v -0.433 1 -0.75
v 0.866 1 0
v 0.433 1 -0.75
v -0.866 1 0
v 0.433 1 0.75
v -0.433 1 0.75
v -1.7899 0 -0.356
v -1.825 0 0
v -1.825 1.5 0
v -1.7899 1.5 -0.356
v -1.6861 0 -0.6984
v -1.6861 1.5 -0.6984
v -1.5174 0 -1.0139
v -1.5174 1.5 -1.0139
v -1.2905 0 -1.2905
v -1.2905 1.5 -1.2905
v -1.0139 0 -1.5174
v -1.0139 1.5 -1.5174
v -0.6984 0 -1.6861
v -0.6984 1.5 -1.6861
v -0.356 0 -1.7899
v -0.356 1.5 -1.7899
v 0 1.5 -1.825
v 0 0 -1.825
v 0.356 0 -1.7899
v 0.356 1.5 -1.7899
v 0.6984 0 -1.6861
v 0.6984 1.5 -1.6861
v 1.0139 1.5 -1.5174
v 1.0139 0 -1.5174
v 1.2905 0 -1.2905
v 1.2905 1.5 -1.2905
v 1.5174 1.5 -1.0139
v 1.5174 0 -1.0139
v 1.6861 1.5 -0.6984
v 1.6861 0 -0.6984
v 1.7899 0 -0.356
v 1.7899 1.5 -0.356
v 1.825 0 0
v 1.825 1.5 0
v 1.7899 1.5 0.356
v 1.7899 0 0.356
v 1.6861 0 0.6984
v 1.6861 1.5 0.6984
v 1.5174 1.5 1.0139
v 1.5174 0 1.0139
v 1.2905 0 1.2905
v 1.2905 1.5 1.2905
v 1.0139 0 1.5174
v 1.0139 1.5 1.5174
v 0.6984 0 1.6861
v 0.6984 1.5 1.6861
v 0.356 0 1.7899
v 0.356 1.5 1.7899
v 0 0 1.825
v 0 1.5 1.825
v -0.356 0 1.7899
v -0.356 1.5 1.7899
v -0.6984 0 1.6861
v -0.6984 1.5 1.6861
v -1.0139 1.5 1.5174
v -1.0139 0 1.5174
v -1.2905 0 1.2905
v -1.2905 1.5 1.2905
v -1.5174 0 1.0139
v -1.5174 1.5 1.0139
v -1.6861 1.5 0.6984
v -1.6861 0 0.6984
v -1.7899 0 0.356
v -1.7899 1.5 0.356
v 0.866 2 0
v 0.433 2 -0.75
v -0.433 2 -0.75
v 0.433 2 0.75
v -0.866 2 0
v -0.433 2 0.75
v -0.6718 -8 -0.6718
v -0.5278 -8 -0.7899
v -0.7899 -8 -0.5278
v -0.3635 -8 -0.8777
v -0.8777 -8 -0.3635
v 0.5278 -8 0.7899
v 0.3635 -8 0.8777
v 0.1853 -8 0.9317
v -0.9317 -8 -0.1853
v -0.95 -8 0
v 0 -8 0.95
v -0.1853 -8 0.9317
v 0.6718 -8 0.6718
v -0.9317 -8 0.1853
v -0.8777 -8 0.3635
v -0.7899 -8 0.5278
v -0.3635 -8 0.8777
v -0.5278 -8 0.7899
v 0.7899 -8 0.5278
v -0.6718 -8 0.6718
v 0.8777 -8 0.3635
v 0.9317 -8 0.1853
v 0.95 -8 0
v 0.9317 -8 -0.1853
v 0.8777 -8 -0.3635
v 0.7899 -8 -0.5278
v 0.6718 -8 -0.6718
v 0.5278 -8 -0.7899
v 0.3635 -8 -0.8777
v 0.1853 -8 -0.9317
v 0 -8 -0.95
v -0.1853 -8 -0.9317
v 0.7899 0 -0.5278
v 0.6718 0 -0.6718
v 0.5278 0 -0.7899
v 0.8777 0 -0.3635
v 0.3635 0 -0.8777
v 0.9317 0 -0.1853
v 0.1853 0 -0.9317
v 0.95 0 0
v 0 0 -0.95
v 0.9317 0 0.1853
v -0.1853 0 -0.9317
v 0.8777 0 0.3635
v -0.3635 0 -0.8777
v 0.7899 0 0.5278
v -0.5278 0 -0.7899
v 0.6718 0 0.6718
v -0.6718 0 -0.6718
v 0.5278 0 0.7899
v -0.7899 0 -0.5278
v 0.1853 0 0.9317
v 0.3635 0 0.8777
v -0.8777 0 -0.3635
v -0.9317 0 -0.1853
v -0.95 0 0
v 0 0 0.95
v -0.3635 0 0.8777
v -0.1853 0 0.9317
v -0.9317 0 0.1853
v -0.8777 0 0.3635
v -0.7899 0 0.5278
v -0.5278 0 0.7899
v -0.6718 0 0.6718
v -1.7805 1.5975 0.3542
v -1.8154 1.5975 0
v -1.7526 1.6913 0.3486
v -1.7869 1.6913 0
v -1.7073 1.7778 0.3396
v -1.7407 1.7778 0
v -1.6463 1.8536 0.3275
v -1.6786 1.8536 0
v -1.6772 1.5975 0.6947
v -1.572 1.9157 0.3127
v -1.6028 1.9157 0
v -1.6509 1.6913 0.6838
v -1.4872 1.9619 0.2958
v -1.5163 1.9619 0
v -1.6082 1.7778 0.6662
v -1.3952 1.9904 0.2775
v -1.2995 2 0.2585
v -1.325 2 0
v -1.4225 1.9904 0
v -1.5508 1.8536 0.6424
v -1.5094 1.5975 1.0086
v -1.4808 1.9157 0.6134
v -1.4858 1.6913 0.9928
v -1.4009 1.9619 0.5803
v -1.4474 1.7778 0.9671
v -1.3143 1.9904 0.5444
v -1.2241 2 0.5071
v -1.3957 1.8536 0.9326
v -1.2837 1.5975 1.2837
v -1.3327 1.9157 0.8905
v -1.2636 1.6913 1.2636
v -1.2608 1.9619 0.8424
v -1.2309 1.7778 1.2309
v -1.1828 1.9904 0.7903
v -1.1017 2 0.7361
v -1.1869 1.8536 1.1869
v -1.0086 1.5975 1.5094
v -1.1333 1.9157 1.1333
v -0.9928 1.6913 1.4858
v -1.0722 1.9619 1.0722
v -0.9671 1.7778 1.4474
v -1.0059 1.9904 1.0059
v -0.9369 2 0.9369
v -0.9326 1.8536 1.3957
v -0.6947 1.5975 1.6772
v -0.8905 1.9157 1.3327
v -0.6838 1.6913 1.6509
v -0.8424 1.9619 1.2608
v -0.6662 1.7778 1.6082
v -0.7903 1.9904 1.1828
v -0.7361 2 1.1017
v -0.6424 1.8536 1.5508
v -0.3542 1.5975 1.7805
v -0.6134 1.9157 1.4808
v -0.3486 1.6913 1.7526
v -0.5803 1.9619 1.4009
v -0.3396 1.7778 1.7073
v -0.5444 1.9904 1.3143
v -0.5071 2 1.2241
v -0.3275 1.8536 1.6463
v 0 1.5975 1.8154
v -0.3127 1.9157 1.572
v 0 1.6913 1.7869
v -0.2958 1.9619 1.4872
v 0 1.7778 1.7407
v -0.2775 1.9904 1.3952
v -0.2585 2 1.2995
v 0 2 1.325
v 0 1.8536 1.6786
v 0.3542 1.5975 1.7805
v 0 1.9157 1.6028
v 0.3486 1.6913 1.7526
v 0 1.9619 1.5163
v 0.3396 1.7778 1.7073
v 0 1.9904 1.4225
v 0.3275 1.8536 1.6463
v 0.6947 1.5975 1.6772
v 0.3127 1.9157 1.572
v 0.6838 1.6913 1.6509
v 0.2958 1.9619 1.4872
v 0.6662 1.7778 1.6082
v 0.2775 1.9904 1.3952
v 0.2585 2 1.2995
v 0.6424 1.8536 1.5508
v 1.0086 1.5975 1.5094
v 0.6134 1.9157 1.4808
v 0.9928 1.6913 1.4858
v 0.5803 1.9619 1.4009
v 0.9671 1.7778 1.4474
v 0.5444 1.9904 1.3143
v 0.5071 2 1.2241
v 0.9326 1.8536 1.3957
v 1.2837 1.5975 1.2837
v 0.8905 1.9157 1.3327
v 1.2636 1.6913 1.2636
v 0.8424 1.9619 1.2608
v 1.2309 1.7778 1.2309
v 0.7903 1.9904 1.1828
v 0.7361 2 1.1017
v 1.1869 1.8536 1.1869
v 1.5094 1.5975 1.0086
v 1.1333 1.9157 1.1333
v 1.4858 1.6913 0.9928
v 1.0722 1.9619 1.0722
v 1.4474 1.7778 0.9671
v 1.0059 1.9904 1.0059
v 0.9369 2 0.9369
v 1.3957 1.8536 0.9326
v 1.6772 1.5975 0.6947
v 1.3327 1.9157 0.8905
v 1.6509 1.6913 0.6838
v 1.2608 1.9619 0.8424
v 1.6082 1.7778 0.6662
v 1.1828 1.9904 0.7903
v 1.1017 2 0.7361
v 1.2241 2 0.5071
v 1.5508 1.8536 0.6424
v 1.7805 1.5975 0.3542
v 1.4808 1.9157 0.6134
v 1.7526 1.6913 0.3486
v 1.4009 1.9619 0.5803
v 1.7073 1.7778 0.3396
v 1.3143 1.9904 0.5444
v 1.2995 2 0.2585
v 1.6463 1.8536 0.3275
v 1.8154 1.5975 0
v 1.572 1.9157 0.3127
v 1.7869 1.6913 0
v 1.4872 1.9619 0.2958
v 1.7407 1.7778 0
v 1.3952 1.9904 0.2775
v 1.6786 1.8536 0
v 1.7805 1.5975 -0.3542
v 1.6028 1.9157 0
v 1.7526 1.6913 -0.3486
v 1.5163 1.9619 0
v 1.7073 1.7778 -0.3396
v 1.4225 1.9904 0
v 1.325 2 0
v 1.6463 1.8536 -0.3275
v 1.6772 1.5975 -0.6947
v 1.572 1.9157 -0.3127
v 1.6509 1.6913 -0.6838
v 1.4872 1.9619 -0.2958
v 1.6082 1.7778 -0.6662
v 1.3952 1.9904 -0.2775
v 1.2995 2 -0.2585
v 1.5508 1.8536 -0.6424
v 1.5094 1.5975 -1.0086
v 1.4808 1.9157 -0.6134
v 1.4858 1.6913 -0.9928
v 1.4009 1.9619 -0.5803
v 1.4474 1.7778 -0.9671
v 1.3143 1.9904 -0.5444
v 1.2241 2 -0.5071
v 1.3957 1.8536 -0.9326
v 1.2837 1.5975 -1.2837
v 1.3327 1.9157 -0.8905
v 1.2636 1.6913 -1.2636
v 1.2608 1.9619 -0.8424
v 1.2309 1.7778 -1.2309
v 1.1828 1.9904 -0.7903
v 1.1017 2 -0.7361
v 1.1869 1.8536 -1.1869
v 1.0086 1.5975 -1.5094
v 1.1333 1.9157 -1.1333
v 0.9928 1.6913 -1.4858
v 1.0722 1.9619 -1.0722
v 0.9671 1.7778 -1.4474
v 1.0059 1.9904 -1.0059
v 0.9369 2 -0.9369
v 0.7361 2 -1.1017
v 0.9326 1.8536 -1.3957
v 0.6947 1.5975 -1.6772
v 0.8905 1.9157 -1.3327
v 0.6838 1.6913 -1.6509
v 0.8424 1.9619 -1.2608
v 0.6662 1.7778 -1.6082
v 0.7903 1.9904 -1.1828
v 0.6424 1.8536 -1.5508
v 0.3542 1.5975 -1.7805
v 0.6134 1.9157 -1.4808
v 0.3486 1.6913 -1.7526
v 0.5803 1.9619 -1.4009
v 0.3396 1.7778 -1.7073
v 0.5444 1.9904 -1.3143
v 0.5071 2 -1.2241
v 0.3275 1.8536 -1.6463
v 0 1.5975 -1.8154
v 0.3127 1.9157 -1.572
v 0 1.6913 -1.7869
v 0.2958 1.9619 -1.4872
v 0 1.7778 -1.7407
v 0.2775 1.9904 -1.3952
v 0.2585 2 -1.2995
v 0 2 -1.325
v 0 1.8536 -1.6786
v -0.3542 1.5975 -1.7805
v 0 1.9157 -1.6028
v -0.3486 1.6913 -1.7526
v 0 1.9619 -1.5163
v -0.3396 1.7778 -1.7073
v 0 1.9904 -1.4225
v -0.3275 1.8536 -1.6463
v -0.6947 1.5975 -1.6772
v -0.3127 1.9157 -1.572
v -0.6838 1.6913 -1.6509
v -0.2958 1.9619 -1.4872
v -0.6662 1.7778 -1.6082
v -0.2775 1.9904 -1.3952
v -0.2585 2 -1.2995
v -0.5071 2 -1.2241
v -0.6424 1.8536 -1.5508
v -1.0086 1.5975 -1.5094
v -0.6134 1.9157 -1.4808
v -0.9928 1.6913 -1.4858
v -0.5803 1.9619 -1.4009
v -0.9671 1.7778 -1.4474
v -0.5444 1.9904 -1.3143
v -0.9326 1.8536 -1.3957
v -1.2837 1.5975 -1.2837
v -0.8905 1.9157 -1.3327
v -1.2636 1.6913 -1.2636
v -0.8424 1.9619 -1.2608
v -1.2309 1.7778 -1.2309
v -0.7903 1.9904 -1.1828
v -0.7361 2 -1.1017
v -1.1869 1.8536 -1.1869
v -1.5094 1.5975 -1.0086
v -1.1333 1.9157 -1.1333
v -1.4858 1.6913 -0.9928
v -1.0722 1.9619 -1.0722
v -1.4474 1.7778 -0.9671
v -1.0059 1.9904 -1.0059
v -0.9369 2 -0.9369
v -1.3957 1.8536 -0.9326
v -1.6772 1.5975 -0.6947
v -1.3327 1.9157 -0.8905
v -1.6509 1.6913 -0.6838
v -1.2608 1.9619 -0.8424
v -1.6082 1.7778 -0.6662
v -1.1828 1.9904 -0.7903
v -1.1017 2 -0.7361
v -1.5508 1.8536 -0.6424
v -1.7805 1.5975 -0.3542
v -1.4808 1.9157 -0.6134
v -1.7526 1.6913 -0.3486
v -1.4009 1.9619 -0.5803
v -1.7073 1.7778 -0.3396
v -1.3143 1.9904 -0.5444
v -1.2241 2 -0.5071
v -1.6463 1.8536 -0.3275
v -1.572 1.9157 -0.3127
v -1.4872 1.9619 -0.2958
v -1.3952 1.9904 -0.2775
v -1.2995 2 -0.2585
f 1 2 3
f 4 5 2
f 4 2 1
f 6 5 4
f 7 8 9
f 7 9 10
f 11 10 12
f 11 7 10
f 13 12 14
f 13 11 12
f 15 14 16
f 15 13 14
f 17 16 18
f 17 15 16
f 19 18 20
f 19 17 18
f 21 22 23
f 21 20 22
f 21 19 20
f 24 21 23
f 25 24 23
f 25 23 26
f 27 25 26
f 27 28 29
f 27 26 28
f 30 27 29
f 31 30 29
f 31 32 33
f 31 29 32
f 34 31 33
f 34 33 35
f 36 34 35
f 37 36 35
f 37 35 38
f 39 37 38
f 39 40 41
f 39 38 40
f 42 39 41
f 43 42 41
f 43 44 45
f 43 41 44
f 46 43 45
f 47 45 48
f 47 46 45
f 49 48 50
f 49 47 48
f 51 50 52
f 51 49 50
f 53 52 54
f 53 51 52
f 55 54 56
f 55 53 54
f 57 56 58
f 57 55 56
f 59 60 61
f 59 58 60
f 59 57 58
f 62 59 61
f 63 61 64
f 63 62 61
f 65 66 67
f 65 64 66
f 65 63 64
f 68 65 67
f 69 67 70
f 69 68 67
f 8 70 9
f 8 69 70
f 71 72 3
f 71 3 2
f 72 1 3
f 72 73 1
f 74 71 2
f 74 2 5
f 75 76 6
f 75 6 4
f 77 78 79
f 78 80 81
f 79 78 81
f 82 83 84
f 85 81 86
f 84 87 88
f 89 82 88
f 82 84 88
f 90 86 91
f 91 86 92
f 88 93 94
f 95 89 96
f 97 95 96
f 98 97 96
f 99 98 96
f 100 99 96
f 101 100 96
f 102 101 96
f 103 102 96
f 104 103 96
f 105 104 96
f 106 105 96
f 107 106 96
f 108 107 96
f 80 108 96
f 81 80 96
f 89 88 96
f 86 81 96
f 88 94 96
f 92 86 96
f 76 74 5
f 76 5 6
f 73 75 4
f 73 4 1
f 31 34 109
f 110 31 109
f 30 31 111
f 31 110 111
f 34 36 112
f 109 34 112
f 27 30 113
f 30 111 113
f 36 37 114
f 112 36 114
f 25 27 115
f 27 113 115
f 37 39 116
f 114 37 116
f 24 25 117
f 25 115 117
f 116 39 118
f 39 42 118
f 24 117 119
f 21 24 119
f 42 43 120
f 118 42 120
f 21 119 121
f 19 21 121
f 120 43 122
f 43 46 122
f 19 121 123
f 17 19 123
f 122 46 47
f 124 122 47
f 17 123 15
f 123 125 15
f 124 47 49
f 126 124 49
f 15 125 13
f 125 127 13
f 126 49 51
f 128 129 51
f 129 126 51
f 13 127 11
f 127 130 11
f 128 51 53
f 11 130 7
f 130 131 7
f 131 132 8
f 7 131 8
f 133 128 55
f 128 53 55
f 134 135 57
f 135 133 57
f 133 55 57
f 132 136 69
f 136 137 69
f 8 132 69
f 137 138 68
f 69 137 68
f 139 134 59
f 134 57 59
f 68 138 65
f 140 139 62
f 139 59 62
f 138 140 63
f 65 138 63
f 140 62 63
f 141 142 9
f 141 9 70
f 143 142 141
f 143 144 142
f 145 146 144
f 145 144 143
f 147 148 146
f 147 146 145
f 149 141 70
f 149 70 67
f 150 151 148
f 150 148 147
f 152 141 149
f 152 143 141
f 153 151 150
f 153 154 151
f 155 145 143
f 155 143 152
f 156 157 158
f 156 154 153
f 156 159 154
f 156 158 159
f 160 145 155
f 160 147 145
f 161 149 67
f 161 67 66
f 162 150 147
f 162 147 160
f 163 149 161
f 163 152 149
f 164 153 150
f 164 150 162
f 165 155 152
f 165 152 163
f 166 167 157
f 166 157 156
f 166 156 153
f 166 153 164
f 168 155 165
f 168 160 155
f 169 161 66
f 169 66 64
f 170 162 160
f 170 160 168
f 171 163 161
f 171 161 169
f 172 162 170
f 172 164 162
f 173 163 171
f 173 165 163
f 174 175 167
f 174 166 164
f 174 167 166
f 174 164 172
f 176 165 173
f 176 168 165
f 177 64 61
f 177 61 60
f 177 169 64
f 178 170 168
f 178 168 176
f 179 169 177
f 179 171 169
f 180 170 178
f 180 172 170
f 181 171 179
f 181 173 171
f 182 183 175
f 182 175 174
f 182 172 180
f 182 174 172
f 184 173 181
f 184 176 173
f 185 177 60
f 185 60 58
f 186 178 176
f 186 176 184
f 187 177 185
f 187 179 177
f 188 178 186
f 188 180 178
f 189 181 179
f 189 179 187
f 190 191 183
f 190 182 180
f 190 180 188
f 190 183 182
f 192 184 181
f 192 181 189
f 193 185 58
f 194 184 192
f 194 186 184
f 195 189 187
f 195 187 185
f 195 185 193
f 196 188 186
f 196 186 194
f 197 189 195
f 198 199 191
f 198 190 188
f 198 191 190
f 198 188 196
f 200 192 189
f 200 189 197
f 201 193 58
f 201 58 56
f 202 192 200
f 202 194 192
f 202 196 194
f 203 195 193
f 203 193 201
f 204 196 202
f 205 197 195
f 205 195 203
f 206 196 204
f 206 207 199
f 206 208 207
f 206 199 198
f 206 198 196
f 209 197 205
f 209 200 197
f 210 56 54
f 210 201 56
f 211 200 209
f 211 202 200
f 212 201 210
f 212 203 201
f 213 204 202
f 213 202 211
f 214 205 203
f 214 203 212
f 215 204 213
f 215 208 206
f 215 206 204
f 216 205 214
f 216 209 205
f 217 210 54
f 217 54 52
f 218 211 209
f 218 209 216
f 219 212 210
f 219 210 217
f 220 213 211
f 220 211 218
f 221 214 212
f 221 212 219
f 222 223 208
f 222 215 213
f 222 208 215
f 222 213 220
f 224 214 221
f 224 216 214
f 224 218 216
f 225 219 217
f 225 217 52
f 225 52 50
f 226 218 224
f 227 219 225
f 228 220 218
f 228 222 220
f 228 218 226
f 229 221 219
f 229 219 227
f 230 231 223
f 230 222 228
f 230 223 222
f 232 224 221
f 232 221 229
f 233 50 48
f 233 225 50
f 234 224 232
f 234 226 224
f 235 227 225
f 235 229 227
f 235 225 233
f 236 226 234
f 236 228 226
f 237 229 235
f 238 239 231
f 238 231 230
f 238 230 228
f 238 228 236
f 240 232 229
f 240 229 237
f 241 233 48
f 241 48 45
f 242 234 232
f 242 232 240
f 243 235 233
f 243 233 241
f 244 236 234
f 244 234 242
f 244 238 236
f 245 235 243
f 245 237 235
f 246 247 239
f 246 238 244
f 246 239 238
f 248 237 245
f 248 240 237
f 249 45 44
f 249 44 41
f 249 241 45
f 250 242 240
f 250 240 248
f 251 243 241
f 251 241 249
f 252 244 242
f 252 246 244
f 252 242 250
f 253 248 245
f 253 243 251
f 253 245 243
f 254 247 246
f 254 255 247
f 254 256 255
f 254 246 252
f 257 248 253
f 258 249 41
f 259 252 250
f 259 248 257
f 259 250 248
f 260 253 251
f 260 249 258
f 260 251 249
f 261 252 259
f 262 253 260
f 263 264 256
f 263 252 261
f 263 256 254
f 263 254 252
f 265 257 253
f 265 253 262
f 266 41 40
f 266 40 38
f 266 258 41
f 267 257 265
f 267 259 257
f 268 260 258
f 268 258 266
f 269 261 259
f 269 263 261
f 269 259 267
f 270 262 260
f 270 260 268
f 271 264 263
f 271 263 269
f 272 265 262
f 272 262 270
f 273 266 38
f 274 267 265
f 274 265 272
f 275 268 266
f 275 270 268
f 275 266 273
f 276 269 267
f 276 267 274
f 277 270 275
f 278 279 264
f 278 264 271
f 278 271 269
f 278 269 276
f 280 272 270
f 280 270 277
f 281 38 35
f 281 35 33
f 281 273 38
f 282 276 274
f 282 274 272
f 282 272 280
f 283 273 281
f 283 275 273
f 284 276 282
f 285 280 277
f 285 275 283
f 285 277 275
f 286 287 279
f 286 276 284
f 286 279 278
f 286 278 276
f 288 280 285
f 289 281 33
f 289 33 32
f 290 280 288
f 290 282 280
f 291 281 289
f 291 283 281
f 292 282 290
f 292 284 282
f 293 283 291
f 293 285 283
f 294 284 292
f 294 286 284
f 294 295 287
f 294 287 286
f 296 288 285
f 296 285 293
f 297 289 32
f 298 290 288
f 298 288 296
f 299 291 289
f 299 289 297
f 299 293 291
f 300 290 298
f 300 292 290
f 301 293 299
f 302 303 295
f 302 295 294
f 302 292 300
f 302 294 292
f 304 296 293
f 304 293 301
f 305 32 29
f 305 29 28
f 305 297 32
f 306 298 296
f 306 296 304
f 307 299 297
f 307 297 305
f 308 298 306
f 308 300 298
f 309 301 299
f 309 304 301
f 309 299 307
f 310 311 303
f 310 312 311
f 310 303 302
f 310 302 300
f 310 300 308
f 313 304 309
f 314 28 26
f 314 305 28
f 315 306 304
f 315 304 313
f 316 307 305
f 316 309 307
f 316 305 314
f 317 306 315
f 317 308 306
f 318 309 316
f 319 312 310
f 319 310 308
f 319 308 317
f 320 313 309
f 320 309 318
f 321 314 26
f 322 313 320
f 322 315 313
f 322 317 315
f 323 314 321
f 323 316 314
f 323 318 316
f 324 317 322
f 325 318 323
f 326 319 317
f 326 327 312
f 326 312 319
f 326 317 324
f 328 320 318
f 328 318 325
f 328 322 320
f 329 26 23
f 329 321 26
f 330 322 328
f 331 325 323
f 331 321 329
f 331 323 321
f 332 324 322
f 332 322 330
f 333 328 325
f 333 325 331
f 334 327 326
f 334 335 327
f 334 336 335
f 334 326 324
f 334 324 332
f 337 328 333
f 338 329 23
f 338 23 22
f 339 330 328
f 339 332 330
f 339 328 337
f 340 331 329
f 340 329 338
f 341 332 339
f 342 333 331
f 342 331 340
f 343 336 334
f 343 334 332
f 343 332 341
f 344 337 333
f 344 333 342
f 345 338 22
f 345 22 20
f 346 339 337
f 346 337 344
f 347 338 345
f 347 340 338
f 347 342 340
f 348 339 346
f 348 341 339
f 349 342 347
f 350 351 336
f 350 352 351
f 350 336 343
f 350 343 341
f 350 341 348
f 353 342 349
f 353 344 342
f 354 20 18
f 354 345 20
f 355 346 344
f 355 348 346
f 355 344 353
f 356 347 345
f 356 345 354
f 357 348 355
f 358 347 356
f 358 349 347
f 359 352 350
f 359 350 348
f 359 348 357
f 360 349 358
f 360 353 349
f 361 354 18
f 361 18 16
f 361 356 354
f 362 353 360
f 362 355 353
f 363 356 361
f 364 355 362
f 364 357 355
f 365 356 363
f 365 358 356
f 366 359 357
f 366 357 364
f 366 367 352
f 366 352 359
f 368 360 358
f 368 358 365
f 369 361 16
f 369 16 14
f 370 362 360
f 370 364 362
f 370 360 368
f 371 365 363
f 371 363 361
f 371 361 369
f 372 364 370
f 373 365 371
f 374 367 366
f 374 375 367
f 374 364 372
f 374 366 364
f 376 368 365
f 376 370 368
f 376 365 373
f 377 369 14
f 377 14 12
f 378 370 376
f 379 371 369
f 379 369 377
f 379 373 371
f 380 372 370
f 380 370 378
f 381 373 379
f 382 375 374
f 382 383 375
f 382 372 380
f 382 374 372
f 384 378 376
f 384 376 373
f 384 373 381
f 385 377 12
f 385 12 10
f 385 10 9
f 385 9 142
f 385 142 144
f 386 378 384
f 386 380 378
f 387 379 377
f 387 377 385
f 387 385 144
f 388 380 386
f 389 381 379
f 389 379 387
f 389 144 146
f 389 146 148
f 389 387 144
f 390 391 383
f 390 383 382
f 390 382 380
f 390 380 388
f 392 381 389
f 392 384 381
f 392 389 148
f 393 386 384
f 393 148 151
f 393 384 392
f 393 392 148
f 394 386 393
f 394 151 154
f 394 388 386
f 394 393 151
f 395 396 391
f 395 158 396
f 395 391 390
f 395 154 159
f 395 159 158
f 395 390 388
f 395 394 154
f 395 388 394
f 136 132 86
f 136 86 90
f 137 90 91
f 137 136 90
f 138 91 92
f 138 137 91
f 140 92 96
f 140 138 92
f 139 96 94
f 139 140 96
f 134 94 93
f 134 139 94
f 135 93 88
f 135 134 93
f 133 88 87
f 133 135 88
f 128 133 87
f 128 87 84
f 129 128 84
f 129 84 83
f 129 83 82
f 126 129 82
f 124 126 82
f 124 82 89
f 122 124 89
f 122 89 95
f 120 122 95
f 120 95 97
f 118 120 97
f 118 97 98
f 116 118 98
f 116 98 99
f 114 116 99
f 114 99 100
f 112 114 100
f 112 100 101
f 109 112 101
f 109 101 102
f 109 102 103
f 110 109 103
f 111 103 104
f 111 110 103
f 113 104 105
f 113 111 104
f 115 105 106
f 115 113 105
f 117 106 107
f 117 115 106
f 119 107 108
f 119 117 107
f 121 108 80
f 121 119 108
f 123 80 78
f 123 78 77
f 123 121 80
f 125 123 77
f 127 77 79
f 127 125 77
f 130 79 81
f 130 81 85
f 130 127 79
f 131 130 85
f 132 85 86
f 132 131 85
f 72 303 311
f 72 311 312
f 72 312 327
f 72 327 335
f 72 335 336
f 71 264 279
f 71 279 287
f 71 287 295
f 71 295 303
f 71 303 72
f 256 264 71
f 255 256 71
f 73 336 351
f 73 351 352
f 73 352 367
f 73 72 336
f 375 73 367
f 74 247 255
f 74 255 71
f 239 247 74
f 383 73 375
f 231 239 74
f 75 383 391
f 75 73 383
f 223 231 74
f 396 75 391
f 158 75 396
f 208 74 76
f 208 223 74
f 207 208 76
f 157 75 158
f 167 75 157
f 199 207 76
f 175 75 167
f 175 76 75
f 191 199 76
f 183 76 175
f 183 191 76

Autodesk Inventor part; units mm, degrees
ref_plane "YZ Plane" through (0, 0, 0) normal (1, 0, 0) x (0, 1, 0)
ref_plane "XZ Plane" through (0, 0, 0) normal (0, 1, 0) x (-1, 0, 0)
ref_plane "XY Plane" through (0, 0, 0) normal (0, 0, 1) x (1, 0, 0)
sketch "Sketch1" plane through (0, 0, 0) normal (0, 1, 0) x (-1, 0, 0)
  circle A0 centre (0, 0) radius 0.95
  circle A1 centre (0, 0) radius 1.825
  line L0 (0.433, -0.75) -> (-0.433, -0.75)
  line L1 (-0.433, -0.75) -> (-0.866, 0)
  line L2 (-0.866, 0) -> (-0.433, 0.75)
  line L3 (-0.433, 0.75) -> (0.433, 0.75)
  line L4 (0.433, 0.75) -> (0.866, 0)
  line L5 (0.866, 0) -> (0.433, -0.75)
  dimension "d0" = 1.9
  dimension "d1" = 3.65
  dimension "d8" = 1.5
extrude "Extrusion1" add sketch "Sketch1" along normal blind 2 contours A0 | A1 | L0 L1 L2 L3 L4 L5
extrude "Extrusion2" add sketch "Sketch1" against normal blind 8 contours A0 | L0 L1 L2 L3 L4 L5
extrude "Extrusion3" cut sketch "Sketch1" against normal blind 1 from surface at 2 contours L0 L1 L2 L3 L4 L5
fillet "Fillet1" radius 0.5 1 edges at (1.825, 2, 0)
thread "Thread2" size "M2x0.4" class "6g" standard "ANSI Metric M Profile" full length
equation "\"d4\" = length"
equation "\"length\" = 8"
properties part number "M2x16"
